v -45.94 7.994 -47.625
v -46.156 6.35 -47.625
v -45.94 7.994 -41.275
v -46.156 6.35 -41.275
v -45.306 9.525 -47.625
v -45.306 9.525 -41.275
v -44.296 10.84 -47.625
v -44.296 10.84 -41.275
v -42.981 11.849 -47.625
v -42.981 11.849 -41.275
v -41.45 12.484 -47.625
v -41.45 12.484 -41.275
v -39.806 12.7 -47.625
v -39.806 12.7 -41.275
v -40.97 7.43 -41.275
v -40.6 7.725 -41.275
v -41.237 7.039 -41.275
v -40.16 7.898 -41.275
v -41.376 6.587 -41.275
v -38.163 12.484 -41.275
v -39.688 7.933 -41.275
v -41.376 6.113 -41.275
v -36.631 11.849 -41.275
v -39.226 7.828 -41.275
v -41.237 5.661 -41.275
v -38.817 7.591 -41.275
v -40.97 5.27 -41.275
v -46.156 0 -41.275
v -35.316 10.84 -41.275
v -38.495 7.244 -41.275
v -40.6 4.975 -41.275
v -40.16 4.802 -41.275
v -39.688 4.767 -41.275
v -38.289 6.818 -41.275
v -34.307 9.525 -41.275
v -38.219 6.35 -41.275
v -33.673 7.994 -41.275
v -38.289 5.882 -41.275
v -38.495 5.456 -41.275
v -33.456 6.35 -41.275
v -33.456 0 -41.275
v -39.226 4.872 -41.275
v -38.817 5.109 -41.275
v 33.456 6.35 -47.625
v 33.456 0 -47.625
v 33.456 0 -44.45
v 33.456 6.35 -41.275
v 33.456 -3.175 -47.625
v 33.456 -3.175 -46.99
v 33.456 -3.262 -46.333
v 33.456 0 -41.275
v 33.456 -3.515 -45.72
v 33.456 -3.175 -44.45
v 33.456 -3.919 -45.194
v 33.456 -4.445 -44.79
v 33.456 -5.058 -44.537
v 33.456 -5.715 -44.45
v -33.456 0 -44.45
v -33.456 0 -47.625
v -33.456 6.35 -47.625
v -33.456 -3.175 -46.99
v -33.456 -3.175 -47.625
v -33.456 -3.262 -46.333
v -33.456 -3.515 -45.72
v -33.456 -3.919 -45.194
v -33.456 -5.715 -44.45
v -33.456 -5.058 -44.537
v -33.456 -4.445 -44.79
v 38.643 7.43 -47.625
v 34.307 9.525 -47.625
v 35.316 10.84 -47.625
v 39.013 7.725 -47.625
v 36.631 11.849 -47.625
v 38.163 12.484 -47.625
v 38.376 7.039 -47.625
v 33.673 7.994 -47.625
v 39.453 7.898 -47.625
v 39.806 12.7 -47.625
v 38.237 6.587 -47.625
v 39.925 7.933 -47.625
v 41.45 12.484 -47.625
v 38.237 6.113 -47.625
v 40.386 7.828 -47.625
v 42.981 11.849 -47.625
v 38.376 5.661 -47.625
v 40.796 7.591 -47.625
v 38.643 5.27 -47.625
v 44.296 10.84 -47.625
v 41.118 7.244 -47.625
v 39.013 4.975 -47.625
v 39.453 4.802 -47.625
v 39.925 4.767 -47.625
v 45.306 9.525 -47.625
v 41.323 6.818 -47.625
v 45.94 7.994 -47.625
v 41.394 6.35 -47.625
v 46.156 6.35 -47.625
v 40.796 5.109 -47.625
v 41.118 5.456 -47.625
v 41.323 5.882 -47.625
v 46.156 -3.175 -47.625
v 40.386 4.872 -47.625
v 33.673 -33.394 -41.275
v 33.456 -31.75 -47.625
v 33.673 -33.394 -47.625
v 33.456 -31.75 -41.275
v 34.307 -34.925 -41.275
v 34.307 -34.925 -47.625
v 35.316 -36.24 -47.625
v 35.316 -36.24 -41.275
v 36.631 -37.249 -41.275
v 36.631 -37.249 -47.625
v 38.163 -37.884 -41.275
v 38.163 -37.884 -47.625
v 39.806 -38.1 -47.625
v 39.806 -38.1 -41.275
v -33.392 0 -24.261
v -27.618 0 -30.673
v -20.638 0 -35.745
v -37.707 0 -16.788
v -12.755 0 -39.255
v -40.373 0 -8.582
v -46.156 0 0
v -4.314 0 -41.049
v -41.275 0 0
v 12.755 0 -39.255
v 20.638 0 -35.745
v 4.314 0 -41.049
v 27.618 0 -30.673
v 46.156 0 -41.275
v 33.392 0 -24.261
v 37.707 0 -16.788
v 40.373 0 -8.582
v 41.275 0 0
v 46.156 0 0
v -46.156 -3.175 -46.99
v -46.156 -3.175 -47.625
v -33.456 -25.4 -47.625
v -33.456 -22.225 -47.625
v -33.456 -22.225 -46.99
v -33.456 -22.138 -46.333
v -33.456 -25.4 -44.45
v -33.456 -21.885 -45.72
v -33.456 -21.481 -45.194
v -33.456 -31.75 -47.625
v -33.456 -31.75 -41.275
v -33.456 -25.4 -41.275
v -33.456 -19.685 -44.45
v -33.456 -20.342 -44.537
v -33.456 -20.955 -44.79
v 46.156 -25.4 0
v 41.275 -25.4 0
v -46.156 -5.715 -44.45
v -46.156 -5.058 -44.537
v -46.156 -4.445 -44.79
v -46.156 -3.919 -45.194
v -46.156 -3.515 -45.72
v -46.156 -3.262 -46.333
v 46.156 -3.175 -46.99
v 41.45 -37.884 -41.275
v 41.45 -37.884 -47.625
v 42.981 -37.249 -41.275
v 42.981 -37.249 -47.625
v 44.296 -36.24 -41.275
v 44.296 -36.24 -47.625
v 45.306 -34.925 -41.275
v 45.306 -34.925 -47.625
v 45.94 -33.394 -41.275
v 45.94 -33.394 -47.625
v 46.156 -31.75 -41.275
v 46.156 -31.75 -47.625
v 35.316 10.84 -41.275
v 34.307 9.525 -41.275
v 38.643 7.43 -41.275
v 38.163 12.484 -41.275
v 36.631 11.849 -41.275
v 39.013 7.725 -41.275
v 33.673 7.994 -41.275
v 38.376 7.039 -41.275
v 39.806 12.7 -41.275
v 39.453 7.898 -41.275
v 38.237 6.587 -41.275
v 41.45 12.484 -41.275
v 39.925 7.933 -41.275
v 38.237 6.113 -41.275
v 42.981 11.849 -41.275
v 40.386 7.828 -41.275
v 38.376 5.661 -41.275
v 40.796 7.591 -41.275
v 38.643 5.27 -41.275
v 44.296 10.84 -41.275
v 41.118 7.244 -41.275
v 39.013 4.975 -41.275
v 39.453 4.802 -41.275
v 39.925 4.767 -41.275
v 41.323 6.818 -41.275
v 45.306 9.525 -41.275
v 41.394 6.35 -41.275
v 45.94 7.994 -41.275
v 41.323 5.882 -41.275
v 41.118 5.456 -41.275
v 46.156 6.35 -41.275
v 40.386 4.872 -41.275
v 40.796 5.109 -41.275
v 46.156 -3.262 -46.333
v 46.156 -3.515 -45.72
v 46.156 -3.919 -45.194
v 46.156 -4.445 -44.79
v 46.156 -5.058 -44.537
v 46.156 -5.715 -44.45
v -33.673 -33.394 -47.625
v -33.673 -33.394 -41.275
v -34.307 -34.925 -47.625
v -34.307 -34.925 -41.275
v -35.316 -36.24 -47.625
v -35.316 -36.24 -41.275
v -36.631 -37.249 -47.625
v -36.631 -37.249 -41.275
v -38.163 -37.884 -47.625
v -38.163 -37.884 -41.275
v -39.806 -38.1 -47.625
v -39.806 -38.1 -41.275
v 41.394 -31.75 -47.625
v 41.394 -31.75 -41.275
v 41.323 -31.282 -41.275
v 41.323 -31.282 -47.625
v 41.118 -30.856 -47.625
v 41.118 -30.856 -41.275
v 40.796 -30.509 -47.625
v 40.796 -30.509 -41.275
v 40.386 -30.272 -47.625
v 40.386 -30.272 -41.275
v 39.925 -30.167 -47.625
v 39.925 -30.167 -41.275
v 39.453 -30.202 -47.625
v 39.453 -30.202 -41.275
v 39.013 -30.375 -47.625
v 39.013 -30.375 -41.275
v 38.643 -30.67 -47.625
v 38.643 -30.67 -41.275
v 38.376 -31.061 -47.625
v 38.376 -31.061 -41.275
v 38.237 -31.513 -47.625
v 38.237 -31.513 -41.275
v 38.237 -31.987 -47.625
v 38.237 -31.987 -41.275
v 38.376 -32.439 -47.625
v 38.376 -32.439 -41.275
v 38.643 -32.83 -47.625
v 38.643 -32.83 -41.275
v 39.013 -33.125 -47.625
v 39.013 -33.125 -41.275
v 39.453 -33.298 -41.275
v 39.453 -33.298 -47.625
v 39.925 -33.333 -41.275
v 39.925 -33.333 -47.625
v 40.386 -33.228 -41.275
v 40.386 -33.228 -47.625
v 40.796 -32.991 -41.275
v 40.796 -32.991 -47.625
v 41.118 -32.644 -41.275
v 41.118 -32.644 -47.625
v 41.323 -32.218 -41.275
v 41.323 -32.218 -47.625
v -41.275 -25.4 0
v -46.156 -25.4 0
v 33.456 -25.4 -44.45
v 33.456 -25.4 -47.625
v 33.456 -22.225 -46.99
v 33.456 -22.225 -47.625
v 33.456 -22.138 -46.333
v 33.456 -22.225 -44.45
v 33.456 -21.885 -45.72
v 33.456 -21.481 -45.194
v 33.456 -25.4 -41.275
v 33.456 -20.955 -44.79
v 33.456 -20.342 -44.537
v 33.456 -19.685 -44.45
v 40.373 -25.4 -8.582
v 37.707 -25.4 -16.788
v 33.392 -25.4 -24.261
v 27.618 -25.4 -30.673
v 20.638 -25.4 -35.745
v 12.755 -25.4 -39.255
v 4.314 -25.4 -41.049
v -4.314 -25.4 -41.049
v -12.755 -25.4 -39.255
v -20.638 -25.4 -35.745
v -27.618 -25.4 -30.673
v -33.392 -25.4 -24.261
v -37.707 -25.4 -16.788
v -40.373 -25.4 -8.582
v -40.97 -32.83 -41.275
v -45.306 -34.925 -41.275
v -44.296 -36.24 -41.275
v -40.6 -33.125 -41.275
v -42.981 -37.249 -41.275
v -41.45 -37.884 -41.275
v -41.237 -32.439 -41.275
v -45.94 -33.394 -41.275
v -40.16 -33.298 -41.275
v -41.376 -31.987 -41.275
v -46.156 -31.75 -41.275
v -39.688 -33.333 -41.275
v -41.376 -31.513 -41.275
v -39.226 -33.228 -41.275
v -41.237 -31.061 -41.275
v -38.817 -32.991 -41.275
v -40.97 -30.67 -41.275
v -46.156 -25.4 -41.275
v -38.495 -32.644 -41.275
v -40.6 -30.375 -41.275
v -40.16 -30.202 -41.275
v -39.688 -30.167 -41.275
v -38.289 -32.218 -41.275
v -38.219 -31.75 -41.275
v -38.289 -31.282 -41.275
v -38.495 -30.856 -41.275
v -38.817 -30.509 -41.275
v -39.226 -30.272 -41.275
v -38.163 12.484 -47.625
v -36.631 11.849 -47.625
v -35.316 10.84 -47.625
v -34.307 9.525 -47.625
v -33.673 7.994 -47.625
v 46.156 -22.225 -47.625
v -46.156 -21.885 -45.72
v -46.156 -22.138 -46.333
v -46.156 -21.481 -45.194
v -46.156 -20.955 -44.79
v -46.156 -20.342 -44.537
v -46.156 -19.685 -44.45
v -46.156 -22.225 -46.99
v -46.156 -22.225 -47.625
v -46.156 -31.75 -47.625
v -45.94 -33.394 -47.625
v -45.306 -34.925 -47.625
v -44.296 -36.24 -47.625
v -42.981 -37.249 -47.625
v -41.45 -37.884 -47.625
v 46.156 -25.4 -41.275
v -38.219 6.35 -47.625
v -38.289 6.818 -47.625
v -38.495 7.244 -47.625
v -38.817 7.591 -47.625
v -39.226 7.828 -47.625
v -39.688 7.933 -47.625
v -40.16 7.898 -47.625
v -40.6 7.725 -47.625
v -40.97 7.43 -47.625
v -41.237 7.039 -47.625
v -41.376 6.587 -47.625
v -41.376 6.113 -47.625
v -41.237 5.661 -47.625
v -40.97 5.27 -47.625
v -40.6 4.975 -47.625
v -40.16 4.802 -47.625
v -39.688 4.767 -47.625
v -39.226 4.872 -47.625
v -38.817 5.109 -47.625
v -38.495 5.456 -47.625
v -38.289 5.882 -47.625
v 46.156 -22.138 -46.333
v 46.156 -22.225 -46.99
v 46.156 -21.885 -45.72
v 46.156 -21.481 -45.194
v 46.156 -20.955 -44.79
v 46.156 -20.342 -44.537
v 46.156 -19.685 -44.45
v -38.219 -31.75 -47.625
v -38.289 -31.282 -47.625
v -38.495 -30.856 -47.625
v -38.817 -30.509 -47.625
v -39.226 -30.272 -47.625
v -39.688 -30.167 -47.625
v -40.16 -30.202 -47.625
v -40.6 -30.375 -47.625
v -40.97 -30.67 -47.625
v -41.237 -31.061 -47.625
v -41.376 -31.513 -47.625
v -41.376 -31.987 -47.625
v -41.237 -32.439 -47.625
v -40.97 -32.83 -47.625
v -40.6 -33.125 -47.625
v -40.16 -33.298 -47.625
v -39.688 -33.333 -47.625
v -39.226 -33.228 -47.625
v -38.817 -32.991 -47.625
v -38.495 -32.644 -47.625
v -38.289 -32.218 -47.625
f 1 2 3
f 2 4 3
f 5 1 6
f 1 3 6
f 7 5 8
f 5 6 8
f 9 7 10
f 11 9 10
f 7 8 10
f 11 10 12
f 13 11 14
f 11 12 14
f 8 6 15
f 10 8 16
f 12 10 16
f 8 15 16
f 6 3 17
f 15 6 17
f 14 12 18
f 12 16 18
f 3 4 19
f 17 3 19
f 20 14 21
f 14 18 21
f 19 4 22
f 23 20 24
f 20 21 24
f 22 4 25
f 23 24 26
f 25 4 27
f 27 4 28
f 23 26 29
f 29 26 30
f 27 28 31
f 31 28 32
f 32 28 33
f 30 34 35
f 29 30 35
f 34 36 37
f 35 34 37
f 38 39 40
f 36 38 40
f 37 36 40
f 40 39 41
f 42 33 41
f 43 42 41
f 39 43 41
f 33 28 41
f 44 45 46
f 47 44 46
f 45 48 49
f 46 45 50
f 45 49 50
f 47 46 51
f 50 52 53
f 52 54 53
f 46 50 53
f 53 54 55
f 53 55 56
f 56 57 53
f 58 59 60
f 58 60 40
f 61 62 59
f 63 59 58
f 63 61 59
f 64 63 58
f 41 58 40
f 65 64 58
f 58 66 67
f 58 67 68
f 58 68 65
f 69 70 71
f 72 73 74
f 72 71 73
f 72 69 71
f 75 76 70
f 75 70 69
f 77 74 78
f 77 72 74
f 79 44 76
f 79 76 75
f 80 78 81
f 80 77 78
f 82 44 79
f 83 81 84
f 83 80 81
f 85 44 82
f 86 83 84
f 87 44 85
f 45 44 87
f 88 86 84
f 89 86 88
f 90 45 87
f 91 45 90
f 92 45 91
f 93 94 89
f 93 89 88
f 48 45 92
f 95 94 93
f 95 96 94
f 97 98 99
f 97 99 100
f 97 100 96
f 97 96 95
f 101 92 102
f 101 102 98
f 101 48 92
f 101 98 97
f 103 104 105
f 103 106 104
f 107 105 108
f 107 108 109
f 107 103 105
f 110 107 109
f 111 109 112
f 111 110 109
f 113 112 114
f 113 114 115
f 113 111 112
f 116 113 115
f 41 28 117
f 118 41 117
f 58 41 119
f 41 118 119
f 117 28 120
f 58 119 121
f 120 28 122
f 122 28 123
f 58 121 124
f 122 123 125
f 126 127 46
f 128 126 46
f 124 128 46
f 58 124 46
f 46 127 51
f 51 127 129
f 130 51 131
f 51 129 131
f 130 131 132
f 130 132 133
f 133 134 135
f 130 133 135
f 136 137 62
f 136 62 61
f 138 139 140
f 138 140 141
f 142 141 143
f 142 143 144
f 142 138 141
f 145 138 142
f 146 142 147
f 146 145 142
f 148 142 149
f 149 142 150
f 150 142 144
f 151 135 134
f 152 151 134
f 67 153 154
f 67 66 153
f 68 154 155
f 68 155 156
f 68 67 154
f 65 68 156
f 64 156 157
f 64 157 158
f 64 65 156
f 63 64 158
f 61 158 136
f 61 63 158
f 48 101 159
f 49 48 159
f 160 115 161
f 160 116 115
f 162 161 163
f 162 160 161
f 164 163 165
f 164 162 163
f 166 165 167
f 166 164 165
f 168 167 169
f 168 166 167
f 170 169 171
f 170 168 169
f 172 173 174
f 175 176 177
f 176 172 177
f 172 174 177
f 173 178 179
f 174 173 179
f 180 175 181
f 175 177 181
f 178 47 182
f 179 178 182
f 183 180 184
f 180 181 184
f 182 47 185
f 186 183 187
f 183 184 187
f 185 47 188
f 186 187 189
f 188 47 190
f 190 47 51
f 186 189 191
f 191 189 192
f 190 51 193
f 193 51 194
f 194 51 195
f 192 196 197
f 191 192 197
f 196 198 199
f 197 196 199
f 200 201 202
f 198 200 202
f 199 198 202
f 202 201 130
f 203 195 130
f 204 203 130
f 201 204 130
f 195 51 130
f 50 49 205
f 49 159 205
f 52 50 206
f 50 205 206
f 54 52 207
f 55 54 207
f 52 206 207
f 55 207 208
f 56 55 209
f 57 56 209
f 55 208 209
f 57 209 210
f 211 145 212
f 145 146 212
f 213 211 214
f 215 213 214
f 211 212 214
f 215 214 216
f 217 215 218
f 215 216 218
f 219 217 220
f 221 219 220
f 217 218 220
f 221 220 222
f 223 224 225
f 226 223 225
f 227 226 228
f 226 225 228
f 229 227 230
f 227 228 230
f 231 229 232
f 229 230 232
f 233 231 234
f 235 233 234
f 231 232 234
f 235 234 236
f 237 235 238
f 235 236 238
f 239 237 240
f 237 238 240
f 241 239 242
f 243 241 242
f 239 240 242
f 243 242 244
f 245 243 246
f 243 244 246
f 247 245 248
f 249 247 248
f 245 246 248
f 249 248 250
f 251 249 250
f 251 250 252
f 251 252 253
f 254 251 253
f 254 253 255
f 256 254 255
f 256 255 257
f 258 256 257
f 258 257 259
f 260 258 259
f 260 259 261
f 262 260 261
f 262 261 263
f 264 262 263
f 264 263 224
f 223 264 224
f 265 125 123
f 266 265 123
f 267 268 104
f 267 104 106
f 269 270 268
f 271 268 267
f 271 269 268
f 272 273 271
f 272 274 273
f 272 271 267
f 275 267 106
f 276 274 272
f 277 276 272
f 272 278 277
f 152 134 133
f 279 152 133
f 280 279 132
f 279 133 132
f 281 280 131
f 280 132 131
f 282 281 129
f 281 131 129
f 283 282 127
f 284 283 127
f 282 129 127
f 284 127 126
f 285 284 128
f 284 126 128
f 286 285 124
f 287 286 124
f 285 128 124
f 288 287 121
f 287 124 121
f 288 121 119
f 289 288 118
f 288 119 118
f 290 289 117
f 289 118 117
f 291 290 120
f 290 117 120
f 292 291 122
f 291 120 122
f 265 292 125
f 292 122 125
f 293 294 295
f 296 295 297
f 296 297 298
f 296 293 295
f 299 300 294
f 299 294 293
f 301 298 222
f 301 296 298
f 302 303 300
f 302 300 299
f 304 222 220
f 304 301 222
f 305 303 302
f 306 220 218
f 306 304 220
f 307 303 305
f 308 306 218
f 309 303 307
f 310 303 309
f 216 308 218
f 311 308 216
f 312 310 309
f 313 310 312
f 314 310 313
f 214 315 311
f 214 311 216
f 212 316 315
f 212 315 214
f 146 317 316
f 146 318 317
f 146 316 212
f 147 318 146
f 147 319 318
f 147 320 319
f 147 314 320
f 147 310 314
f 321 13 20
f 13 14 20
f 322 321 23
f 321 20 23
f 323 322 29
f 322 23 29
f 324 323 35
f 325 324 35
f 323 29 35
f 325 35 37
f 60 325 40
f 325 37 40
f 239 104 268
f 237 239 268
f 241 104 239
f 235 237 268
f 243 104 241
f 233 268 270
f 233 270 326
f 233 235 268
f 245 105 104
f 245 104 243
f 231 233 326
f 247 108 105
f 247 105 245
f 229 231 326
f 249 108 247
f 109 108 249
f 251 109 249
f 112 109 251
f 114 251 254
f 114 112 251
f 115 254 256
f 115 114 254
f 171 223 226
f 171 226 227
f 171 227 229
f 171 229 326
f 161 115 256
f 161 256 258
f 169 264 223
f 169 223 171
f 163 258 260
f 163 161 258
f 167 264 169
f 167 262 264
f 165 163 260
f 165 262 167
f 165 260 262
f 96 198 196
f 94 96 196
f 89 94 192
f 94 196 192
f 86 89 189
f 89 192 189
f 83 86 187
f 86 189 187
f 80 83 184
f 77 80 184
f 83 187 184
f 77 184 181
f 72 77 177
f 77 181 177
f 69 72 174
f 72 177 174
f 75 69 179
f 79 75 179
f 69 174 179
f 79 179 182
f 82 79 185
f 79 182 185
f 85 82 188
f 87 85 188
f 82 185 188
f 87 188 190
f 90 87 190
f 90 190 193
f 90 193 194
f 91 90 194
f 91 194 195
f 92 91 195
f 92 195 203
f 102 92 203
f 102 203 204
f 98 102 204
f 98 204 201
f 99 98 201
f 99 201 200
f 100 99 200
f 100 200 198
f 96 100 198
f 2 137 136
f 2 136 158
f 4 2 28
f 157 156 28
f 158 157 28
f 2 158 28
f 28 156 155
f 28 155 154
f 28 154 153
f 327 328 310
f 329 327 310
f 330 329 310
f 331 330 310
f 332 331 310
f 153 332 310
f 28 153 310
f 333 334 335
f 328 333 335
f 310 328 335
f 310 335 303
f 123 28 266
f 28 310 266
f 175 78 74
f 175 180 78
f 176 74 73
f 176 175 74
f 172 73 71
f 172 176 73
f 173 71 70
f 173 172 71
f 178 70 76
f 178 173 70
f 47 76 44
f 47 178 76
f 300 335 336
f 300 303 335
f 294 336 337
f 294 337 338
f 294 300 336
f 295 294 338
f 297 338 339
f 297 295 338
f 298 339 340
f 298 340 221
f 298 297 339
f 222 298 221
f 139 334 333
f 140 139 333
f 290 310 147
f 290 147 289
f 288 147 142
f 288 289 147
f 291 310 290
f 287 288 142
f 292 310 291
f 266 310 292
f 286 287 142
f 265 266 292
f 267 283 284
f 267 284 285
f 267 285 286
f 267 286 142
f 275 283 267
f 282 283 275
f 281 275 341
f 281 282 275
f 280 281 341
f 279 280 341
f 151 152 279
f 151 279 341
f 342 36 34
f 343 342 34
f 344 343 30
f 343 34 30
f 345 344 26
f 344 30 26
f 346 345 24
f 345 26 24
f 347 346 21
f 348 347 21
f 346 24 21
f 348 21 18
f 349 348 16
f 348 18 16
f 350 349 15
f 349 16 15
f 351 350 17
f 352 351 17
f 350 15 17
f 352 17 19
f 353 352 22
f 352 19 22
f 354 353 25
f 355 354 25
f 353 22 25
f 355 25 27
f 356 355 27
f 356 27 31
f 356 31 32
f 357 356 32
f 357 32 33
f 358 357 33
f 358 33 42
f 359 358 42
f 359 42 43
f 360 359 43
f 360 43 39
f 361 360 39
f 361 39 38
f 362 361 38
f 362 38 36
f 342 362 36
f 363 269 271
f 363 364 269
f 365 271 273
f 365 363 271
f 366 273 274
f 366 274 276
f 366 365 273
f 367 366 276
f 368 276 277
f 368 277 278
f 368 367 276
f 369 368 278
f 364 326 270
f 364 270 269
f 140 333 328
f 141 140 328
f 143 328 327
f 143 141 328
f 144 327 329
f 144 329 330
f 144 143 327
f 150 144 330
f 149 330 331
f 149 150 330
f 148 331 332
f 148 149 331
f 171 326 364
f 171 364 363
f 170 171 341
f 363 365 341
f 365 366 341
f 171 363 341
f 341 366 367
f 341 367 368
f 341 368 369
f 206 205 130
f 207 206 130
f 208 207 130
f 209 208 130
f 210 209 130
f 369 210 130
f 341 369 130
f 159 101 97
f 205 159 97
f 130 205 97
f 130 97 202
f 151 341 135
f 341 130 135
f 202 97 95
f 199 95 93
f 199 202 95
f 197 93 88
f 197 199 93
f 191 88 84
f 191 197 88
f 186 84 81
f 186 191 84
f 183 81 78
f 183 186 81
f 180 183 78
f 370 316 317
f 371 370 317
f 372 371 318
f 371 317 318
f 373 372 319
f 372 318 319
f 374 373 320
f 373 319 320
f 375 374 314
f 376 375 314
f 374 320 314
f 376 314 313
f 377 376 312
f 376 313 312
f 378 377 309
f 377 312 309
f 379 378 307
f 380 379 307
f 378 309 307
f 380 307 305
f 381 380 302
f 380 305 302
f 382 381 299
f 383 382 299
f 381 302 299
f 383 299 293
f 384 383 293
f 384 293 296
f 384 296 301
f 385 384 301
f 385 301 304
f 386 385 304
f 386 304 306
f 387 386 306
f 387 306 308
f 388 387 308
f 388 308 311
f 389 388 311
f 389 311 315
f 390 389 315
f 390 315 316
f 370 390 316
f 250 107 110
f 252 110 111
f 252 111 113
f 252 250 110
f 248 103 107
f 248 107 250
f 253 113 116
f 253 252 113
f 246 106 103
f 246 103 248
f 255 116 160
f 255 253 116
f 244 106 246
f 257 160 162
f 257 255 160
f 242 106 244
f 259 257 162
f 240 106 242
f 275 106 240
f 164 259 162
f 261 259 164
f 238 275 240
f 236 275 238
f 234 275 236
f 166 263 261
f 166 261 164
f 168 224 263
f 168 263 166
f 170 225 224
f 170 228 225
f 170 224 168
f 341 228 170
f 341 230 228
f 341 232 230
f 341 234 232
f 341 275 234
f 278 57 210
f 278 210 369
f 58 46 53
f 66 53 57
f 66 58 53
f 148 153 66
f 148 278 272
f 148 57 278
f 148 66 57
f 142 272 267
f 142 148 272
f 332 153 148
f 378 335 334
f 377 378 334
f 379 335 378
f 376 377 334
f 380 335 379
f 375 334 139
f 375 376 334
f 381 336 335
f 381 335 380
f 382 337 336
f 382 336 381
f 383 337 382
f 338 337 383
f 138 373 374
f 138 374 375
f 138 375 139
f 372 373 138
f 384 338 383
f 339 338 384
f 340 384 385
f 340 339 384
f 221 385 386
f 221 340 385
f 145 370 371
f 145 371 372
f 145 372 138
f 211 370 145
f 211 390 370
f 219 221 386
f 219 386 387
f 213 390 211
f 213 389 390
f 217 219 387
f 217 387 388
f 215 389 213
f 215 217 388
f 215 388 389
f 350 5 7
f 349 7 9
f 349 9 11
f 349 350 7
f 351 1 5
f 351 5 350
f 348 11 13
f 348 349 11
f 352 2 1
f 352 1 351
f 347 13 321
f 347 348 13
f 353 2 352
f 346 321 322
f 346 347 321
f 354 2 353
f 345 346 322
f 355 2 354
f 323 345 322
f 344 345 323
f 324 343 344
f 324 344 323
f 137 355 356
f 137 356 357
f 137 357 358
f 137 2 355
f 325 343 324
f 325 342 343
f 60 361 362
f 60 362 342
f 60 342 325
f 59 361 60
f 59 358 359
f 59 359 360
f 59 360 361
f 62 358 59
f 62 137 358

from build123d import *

# Parameters (mm, degrees)
F1_DEPTH      = 25.4
F2_W          = 12.7
F2_H          = 6.35
F3_DEPTH      = 12.7
F3_DEPTH_BACK = 38.1
F4_R          = 6.34999
F5_W          = 19.05
F5_H          = 3.175
F6_DEPTH      = 92.3136190901
F7_W          = 66.9126190901
F7_H          = 3.175
F8_DEPTH      = 38.101
F9_R          = 2.54
F10_R         = 1.5875
F11_DEPTH     = 6.351


# Not quite as in the source:
# - a fillet or chamfer is up to 0.001 mm smaller than in the source, because OpenCascade refuses the exact size


with BuildPart() as f1:
    # F0 (on Front) → F1 (new body)
    with BuildSketch(Plane.XZ):
        with BuildLine():
            ThreePointArc((41.275, 0), (0, -41.275), (-41.275, 0))
            Line((-41.275, 0), (-46.156309545, 0))
            Line((-46.156309545, 0), (-46.156309545, -47.625))
            Line((-46.156309545, -47.625), (46.156309545, -47.625))
            Line((46.156309545, -47.625), (46.156309545, 0))
            Line((46.156309545, 0), (41.275, 0))
        make_face()
    extrude(amount=F1_DEPTH)

    # F2 (on face) → F3 (join, two sides)
    with BuildSketch(Plane.XZ.offset(25.4)) as f3_sk:
        with Locations((-39.806309545, -44.45)):
            Rectangle(F2_W, F2_H)
        with Locations((39.806309545, -44.45)):
            Rectangle(F2_W, F2_H)
    extrude(amount=F3_DEPTH)
    extrude(f3_sk.sketch, amount=-F3_DEPTH_BACK)

    # F4 (radius 6.35 in the source; OpenCascade refuses exactly that, so slightly less here)
    f4_edges = [f1.edges().sort_by_distance(p)[0] for p in [
        (-46.15631, 12.7, -44.45),
        (-33.45631, 12.7, -44.45),
        (-46.15631, -38.1, -44.45),
        (-33.45631, -38.1, -44.45),
        (33.45631, -38.1, -44.45),
        (46.15631, -38.1, -44.45),
        (33.45631, 12.7, -44.45),
        (46.15631, 12.7, -44.45),
    ]]
    fillet(f4_edges, radius=F4_R)

    # F5 (on face) → F6 (cut, through all)
    with BuildSketch(Plane(origin=(-46.156309545, 0, 0), x_dir=(0, -1, 0), z_dir=(-1, 0, 0))):
        with Locations((12.7, -46.0375)):
            Rectangle(F5_W, F5_H)
    extrude(amount=-F6_DEPTH, mode=Mode.SUBTRACT)

    # F7 (on face) → F8 (cut, through all)
    with BuildSketch(Plane.XZ.offset(25.4)):
        with Locations((0, -46.0375)):
            Rectangle(F7_W, F7_H)
    extrude(amount=-F8_DEPTH, mode=Mode.SUBTRACT)

    # F9
    f9_edges = [f1.edges().sort_by_distance(p)[0] for p in [
        (-39.80631, -22.225, -44.45),
        (-39.80631, -3.175, -44.45),
        (39.80631, -3.175, -44.45),
        (39.80631, -22.225, -44.45),
    ]]
    fillet(f9_edges, radius=F9_R)

    # F10 (on face) → F11 (cut, through all)
    with BuildSketch(Plane.XY.offset(-41.275)):
        with Locations((-39.806309545, -31.75)):
            Circle(F10_R)
        with Locations((-39.806309545, 6.35)):
            Circle(F10_R)
        with Locations((39.806309545, -31.75)):
            Circle(F10_R)
        with Locations((39.806309545, 6.35)):
            Circle(F10_R)
    extrude(amount=-F11_DEPTH, mode=Mode.SUBTRACT)


solid = f1.part
